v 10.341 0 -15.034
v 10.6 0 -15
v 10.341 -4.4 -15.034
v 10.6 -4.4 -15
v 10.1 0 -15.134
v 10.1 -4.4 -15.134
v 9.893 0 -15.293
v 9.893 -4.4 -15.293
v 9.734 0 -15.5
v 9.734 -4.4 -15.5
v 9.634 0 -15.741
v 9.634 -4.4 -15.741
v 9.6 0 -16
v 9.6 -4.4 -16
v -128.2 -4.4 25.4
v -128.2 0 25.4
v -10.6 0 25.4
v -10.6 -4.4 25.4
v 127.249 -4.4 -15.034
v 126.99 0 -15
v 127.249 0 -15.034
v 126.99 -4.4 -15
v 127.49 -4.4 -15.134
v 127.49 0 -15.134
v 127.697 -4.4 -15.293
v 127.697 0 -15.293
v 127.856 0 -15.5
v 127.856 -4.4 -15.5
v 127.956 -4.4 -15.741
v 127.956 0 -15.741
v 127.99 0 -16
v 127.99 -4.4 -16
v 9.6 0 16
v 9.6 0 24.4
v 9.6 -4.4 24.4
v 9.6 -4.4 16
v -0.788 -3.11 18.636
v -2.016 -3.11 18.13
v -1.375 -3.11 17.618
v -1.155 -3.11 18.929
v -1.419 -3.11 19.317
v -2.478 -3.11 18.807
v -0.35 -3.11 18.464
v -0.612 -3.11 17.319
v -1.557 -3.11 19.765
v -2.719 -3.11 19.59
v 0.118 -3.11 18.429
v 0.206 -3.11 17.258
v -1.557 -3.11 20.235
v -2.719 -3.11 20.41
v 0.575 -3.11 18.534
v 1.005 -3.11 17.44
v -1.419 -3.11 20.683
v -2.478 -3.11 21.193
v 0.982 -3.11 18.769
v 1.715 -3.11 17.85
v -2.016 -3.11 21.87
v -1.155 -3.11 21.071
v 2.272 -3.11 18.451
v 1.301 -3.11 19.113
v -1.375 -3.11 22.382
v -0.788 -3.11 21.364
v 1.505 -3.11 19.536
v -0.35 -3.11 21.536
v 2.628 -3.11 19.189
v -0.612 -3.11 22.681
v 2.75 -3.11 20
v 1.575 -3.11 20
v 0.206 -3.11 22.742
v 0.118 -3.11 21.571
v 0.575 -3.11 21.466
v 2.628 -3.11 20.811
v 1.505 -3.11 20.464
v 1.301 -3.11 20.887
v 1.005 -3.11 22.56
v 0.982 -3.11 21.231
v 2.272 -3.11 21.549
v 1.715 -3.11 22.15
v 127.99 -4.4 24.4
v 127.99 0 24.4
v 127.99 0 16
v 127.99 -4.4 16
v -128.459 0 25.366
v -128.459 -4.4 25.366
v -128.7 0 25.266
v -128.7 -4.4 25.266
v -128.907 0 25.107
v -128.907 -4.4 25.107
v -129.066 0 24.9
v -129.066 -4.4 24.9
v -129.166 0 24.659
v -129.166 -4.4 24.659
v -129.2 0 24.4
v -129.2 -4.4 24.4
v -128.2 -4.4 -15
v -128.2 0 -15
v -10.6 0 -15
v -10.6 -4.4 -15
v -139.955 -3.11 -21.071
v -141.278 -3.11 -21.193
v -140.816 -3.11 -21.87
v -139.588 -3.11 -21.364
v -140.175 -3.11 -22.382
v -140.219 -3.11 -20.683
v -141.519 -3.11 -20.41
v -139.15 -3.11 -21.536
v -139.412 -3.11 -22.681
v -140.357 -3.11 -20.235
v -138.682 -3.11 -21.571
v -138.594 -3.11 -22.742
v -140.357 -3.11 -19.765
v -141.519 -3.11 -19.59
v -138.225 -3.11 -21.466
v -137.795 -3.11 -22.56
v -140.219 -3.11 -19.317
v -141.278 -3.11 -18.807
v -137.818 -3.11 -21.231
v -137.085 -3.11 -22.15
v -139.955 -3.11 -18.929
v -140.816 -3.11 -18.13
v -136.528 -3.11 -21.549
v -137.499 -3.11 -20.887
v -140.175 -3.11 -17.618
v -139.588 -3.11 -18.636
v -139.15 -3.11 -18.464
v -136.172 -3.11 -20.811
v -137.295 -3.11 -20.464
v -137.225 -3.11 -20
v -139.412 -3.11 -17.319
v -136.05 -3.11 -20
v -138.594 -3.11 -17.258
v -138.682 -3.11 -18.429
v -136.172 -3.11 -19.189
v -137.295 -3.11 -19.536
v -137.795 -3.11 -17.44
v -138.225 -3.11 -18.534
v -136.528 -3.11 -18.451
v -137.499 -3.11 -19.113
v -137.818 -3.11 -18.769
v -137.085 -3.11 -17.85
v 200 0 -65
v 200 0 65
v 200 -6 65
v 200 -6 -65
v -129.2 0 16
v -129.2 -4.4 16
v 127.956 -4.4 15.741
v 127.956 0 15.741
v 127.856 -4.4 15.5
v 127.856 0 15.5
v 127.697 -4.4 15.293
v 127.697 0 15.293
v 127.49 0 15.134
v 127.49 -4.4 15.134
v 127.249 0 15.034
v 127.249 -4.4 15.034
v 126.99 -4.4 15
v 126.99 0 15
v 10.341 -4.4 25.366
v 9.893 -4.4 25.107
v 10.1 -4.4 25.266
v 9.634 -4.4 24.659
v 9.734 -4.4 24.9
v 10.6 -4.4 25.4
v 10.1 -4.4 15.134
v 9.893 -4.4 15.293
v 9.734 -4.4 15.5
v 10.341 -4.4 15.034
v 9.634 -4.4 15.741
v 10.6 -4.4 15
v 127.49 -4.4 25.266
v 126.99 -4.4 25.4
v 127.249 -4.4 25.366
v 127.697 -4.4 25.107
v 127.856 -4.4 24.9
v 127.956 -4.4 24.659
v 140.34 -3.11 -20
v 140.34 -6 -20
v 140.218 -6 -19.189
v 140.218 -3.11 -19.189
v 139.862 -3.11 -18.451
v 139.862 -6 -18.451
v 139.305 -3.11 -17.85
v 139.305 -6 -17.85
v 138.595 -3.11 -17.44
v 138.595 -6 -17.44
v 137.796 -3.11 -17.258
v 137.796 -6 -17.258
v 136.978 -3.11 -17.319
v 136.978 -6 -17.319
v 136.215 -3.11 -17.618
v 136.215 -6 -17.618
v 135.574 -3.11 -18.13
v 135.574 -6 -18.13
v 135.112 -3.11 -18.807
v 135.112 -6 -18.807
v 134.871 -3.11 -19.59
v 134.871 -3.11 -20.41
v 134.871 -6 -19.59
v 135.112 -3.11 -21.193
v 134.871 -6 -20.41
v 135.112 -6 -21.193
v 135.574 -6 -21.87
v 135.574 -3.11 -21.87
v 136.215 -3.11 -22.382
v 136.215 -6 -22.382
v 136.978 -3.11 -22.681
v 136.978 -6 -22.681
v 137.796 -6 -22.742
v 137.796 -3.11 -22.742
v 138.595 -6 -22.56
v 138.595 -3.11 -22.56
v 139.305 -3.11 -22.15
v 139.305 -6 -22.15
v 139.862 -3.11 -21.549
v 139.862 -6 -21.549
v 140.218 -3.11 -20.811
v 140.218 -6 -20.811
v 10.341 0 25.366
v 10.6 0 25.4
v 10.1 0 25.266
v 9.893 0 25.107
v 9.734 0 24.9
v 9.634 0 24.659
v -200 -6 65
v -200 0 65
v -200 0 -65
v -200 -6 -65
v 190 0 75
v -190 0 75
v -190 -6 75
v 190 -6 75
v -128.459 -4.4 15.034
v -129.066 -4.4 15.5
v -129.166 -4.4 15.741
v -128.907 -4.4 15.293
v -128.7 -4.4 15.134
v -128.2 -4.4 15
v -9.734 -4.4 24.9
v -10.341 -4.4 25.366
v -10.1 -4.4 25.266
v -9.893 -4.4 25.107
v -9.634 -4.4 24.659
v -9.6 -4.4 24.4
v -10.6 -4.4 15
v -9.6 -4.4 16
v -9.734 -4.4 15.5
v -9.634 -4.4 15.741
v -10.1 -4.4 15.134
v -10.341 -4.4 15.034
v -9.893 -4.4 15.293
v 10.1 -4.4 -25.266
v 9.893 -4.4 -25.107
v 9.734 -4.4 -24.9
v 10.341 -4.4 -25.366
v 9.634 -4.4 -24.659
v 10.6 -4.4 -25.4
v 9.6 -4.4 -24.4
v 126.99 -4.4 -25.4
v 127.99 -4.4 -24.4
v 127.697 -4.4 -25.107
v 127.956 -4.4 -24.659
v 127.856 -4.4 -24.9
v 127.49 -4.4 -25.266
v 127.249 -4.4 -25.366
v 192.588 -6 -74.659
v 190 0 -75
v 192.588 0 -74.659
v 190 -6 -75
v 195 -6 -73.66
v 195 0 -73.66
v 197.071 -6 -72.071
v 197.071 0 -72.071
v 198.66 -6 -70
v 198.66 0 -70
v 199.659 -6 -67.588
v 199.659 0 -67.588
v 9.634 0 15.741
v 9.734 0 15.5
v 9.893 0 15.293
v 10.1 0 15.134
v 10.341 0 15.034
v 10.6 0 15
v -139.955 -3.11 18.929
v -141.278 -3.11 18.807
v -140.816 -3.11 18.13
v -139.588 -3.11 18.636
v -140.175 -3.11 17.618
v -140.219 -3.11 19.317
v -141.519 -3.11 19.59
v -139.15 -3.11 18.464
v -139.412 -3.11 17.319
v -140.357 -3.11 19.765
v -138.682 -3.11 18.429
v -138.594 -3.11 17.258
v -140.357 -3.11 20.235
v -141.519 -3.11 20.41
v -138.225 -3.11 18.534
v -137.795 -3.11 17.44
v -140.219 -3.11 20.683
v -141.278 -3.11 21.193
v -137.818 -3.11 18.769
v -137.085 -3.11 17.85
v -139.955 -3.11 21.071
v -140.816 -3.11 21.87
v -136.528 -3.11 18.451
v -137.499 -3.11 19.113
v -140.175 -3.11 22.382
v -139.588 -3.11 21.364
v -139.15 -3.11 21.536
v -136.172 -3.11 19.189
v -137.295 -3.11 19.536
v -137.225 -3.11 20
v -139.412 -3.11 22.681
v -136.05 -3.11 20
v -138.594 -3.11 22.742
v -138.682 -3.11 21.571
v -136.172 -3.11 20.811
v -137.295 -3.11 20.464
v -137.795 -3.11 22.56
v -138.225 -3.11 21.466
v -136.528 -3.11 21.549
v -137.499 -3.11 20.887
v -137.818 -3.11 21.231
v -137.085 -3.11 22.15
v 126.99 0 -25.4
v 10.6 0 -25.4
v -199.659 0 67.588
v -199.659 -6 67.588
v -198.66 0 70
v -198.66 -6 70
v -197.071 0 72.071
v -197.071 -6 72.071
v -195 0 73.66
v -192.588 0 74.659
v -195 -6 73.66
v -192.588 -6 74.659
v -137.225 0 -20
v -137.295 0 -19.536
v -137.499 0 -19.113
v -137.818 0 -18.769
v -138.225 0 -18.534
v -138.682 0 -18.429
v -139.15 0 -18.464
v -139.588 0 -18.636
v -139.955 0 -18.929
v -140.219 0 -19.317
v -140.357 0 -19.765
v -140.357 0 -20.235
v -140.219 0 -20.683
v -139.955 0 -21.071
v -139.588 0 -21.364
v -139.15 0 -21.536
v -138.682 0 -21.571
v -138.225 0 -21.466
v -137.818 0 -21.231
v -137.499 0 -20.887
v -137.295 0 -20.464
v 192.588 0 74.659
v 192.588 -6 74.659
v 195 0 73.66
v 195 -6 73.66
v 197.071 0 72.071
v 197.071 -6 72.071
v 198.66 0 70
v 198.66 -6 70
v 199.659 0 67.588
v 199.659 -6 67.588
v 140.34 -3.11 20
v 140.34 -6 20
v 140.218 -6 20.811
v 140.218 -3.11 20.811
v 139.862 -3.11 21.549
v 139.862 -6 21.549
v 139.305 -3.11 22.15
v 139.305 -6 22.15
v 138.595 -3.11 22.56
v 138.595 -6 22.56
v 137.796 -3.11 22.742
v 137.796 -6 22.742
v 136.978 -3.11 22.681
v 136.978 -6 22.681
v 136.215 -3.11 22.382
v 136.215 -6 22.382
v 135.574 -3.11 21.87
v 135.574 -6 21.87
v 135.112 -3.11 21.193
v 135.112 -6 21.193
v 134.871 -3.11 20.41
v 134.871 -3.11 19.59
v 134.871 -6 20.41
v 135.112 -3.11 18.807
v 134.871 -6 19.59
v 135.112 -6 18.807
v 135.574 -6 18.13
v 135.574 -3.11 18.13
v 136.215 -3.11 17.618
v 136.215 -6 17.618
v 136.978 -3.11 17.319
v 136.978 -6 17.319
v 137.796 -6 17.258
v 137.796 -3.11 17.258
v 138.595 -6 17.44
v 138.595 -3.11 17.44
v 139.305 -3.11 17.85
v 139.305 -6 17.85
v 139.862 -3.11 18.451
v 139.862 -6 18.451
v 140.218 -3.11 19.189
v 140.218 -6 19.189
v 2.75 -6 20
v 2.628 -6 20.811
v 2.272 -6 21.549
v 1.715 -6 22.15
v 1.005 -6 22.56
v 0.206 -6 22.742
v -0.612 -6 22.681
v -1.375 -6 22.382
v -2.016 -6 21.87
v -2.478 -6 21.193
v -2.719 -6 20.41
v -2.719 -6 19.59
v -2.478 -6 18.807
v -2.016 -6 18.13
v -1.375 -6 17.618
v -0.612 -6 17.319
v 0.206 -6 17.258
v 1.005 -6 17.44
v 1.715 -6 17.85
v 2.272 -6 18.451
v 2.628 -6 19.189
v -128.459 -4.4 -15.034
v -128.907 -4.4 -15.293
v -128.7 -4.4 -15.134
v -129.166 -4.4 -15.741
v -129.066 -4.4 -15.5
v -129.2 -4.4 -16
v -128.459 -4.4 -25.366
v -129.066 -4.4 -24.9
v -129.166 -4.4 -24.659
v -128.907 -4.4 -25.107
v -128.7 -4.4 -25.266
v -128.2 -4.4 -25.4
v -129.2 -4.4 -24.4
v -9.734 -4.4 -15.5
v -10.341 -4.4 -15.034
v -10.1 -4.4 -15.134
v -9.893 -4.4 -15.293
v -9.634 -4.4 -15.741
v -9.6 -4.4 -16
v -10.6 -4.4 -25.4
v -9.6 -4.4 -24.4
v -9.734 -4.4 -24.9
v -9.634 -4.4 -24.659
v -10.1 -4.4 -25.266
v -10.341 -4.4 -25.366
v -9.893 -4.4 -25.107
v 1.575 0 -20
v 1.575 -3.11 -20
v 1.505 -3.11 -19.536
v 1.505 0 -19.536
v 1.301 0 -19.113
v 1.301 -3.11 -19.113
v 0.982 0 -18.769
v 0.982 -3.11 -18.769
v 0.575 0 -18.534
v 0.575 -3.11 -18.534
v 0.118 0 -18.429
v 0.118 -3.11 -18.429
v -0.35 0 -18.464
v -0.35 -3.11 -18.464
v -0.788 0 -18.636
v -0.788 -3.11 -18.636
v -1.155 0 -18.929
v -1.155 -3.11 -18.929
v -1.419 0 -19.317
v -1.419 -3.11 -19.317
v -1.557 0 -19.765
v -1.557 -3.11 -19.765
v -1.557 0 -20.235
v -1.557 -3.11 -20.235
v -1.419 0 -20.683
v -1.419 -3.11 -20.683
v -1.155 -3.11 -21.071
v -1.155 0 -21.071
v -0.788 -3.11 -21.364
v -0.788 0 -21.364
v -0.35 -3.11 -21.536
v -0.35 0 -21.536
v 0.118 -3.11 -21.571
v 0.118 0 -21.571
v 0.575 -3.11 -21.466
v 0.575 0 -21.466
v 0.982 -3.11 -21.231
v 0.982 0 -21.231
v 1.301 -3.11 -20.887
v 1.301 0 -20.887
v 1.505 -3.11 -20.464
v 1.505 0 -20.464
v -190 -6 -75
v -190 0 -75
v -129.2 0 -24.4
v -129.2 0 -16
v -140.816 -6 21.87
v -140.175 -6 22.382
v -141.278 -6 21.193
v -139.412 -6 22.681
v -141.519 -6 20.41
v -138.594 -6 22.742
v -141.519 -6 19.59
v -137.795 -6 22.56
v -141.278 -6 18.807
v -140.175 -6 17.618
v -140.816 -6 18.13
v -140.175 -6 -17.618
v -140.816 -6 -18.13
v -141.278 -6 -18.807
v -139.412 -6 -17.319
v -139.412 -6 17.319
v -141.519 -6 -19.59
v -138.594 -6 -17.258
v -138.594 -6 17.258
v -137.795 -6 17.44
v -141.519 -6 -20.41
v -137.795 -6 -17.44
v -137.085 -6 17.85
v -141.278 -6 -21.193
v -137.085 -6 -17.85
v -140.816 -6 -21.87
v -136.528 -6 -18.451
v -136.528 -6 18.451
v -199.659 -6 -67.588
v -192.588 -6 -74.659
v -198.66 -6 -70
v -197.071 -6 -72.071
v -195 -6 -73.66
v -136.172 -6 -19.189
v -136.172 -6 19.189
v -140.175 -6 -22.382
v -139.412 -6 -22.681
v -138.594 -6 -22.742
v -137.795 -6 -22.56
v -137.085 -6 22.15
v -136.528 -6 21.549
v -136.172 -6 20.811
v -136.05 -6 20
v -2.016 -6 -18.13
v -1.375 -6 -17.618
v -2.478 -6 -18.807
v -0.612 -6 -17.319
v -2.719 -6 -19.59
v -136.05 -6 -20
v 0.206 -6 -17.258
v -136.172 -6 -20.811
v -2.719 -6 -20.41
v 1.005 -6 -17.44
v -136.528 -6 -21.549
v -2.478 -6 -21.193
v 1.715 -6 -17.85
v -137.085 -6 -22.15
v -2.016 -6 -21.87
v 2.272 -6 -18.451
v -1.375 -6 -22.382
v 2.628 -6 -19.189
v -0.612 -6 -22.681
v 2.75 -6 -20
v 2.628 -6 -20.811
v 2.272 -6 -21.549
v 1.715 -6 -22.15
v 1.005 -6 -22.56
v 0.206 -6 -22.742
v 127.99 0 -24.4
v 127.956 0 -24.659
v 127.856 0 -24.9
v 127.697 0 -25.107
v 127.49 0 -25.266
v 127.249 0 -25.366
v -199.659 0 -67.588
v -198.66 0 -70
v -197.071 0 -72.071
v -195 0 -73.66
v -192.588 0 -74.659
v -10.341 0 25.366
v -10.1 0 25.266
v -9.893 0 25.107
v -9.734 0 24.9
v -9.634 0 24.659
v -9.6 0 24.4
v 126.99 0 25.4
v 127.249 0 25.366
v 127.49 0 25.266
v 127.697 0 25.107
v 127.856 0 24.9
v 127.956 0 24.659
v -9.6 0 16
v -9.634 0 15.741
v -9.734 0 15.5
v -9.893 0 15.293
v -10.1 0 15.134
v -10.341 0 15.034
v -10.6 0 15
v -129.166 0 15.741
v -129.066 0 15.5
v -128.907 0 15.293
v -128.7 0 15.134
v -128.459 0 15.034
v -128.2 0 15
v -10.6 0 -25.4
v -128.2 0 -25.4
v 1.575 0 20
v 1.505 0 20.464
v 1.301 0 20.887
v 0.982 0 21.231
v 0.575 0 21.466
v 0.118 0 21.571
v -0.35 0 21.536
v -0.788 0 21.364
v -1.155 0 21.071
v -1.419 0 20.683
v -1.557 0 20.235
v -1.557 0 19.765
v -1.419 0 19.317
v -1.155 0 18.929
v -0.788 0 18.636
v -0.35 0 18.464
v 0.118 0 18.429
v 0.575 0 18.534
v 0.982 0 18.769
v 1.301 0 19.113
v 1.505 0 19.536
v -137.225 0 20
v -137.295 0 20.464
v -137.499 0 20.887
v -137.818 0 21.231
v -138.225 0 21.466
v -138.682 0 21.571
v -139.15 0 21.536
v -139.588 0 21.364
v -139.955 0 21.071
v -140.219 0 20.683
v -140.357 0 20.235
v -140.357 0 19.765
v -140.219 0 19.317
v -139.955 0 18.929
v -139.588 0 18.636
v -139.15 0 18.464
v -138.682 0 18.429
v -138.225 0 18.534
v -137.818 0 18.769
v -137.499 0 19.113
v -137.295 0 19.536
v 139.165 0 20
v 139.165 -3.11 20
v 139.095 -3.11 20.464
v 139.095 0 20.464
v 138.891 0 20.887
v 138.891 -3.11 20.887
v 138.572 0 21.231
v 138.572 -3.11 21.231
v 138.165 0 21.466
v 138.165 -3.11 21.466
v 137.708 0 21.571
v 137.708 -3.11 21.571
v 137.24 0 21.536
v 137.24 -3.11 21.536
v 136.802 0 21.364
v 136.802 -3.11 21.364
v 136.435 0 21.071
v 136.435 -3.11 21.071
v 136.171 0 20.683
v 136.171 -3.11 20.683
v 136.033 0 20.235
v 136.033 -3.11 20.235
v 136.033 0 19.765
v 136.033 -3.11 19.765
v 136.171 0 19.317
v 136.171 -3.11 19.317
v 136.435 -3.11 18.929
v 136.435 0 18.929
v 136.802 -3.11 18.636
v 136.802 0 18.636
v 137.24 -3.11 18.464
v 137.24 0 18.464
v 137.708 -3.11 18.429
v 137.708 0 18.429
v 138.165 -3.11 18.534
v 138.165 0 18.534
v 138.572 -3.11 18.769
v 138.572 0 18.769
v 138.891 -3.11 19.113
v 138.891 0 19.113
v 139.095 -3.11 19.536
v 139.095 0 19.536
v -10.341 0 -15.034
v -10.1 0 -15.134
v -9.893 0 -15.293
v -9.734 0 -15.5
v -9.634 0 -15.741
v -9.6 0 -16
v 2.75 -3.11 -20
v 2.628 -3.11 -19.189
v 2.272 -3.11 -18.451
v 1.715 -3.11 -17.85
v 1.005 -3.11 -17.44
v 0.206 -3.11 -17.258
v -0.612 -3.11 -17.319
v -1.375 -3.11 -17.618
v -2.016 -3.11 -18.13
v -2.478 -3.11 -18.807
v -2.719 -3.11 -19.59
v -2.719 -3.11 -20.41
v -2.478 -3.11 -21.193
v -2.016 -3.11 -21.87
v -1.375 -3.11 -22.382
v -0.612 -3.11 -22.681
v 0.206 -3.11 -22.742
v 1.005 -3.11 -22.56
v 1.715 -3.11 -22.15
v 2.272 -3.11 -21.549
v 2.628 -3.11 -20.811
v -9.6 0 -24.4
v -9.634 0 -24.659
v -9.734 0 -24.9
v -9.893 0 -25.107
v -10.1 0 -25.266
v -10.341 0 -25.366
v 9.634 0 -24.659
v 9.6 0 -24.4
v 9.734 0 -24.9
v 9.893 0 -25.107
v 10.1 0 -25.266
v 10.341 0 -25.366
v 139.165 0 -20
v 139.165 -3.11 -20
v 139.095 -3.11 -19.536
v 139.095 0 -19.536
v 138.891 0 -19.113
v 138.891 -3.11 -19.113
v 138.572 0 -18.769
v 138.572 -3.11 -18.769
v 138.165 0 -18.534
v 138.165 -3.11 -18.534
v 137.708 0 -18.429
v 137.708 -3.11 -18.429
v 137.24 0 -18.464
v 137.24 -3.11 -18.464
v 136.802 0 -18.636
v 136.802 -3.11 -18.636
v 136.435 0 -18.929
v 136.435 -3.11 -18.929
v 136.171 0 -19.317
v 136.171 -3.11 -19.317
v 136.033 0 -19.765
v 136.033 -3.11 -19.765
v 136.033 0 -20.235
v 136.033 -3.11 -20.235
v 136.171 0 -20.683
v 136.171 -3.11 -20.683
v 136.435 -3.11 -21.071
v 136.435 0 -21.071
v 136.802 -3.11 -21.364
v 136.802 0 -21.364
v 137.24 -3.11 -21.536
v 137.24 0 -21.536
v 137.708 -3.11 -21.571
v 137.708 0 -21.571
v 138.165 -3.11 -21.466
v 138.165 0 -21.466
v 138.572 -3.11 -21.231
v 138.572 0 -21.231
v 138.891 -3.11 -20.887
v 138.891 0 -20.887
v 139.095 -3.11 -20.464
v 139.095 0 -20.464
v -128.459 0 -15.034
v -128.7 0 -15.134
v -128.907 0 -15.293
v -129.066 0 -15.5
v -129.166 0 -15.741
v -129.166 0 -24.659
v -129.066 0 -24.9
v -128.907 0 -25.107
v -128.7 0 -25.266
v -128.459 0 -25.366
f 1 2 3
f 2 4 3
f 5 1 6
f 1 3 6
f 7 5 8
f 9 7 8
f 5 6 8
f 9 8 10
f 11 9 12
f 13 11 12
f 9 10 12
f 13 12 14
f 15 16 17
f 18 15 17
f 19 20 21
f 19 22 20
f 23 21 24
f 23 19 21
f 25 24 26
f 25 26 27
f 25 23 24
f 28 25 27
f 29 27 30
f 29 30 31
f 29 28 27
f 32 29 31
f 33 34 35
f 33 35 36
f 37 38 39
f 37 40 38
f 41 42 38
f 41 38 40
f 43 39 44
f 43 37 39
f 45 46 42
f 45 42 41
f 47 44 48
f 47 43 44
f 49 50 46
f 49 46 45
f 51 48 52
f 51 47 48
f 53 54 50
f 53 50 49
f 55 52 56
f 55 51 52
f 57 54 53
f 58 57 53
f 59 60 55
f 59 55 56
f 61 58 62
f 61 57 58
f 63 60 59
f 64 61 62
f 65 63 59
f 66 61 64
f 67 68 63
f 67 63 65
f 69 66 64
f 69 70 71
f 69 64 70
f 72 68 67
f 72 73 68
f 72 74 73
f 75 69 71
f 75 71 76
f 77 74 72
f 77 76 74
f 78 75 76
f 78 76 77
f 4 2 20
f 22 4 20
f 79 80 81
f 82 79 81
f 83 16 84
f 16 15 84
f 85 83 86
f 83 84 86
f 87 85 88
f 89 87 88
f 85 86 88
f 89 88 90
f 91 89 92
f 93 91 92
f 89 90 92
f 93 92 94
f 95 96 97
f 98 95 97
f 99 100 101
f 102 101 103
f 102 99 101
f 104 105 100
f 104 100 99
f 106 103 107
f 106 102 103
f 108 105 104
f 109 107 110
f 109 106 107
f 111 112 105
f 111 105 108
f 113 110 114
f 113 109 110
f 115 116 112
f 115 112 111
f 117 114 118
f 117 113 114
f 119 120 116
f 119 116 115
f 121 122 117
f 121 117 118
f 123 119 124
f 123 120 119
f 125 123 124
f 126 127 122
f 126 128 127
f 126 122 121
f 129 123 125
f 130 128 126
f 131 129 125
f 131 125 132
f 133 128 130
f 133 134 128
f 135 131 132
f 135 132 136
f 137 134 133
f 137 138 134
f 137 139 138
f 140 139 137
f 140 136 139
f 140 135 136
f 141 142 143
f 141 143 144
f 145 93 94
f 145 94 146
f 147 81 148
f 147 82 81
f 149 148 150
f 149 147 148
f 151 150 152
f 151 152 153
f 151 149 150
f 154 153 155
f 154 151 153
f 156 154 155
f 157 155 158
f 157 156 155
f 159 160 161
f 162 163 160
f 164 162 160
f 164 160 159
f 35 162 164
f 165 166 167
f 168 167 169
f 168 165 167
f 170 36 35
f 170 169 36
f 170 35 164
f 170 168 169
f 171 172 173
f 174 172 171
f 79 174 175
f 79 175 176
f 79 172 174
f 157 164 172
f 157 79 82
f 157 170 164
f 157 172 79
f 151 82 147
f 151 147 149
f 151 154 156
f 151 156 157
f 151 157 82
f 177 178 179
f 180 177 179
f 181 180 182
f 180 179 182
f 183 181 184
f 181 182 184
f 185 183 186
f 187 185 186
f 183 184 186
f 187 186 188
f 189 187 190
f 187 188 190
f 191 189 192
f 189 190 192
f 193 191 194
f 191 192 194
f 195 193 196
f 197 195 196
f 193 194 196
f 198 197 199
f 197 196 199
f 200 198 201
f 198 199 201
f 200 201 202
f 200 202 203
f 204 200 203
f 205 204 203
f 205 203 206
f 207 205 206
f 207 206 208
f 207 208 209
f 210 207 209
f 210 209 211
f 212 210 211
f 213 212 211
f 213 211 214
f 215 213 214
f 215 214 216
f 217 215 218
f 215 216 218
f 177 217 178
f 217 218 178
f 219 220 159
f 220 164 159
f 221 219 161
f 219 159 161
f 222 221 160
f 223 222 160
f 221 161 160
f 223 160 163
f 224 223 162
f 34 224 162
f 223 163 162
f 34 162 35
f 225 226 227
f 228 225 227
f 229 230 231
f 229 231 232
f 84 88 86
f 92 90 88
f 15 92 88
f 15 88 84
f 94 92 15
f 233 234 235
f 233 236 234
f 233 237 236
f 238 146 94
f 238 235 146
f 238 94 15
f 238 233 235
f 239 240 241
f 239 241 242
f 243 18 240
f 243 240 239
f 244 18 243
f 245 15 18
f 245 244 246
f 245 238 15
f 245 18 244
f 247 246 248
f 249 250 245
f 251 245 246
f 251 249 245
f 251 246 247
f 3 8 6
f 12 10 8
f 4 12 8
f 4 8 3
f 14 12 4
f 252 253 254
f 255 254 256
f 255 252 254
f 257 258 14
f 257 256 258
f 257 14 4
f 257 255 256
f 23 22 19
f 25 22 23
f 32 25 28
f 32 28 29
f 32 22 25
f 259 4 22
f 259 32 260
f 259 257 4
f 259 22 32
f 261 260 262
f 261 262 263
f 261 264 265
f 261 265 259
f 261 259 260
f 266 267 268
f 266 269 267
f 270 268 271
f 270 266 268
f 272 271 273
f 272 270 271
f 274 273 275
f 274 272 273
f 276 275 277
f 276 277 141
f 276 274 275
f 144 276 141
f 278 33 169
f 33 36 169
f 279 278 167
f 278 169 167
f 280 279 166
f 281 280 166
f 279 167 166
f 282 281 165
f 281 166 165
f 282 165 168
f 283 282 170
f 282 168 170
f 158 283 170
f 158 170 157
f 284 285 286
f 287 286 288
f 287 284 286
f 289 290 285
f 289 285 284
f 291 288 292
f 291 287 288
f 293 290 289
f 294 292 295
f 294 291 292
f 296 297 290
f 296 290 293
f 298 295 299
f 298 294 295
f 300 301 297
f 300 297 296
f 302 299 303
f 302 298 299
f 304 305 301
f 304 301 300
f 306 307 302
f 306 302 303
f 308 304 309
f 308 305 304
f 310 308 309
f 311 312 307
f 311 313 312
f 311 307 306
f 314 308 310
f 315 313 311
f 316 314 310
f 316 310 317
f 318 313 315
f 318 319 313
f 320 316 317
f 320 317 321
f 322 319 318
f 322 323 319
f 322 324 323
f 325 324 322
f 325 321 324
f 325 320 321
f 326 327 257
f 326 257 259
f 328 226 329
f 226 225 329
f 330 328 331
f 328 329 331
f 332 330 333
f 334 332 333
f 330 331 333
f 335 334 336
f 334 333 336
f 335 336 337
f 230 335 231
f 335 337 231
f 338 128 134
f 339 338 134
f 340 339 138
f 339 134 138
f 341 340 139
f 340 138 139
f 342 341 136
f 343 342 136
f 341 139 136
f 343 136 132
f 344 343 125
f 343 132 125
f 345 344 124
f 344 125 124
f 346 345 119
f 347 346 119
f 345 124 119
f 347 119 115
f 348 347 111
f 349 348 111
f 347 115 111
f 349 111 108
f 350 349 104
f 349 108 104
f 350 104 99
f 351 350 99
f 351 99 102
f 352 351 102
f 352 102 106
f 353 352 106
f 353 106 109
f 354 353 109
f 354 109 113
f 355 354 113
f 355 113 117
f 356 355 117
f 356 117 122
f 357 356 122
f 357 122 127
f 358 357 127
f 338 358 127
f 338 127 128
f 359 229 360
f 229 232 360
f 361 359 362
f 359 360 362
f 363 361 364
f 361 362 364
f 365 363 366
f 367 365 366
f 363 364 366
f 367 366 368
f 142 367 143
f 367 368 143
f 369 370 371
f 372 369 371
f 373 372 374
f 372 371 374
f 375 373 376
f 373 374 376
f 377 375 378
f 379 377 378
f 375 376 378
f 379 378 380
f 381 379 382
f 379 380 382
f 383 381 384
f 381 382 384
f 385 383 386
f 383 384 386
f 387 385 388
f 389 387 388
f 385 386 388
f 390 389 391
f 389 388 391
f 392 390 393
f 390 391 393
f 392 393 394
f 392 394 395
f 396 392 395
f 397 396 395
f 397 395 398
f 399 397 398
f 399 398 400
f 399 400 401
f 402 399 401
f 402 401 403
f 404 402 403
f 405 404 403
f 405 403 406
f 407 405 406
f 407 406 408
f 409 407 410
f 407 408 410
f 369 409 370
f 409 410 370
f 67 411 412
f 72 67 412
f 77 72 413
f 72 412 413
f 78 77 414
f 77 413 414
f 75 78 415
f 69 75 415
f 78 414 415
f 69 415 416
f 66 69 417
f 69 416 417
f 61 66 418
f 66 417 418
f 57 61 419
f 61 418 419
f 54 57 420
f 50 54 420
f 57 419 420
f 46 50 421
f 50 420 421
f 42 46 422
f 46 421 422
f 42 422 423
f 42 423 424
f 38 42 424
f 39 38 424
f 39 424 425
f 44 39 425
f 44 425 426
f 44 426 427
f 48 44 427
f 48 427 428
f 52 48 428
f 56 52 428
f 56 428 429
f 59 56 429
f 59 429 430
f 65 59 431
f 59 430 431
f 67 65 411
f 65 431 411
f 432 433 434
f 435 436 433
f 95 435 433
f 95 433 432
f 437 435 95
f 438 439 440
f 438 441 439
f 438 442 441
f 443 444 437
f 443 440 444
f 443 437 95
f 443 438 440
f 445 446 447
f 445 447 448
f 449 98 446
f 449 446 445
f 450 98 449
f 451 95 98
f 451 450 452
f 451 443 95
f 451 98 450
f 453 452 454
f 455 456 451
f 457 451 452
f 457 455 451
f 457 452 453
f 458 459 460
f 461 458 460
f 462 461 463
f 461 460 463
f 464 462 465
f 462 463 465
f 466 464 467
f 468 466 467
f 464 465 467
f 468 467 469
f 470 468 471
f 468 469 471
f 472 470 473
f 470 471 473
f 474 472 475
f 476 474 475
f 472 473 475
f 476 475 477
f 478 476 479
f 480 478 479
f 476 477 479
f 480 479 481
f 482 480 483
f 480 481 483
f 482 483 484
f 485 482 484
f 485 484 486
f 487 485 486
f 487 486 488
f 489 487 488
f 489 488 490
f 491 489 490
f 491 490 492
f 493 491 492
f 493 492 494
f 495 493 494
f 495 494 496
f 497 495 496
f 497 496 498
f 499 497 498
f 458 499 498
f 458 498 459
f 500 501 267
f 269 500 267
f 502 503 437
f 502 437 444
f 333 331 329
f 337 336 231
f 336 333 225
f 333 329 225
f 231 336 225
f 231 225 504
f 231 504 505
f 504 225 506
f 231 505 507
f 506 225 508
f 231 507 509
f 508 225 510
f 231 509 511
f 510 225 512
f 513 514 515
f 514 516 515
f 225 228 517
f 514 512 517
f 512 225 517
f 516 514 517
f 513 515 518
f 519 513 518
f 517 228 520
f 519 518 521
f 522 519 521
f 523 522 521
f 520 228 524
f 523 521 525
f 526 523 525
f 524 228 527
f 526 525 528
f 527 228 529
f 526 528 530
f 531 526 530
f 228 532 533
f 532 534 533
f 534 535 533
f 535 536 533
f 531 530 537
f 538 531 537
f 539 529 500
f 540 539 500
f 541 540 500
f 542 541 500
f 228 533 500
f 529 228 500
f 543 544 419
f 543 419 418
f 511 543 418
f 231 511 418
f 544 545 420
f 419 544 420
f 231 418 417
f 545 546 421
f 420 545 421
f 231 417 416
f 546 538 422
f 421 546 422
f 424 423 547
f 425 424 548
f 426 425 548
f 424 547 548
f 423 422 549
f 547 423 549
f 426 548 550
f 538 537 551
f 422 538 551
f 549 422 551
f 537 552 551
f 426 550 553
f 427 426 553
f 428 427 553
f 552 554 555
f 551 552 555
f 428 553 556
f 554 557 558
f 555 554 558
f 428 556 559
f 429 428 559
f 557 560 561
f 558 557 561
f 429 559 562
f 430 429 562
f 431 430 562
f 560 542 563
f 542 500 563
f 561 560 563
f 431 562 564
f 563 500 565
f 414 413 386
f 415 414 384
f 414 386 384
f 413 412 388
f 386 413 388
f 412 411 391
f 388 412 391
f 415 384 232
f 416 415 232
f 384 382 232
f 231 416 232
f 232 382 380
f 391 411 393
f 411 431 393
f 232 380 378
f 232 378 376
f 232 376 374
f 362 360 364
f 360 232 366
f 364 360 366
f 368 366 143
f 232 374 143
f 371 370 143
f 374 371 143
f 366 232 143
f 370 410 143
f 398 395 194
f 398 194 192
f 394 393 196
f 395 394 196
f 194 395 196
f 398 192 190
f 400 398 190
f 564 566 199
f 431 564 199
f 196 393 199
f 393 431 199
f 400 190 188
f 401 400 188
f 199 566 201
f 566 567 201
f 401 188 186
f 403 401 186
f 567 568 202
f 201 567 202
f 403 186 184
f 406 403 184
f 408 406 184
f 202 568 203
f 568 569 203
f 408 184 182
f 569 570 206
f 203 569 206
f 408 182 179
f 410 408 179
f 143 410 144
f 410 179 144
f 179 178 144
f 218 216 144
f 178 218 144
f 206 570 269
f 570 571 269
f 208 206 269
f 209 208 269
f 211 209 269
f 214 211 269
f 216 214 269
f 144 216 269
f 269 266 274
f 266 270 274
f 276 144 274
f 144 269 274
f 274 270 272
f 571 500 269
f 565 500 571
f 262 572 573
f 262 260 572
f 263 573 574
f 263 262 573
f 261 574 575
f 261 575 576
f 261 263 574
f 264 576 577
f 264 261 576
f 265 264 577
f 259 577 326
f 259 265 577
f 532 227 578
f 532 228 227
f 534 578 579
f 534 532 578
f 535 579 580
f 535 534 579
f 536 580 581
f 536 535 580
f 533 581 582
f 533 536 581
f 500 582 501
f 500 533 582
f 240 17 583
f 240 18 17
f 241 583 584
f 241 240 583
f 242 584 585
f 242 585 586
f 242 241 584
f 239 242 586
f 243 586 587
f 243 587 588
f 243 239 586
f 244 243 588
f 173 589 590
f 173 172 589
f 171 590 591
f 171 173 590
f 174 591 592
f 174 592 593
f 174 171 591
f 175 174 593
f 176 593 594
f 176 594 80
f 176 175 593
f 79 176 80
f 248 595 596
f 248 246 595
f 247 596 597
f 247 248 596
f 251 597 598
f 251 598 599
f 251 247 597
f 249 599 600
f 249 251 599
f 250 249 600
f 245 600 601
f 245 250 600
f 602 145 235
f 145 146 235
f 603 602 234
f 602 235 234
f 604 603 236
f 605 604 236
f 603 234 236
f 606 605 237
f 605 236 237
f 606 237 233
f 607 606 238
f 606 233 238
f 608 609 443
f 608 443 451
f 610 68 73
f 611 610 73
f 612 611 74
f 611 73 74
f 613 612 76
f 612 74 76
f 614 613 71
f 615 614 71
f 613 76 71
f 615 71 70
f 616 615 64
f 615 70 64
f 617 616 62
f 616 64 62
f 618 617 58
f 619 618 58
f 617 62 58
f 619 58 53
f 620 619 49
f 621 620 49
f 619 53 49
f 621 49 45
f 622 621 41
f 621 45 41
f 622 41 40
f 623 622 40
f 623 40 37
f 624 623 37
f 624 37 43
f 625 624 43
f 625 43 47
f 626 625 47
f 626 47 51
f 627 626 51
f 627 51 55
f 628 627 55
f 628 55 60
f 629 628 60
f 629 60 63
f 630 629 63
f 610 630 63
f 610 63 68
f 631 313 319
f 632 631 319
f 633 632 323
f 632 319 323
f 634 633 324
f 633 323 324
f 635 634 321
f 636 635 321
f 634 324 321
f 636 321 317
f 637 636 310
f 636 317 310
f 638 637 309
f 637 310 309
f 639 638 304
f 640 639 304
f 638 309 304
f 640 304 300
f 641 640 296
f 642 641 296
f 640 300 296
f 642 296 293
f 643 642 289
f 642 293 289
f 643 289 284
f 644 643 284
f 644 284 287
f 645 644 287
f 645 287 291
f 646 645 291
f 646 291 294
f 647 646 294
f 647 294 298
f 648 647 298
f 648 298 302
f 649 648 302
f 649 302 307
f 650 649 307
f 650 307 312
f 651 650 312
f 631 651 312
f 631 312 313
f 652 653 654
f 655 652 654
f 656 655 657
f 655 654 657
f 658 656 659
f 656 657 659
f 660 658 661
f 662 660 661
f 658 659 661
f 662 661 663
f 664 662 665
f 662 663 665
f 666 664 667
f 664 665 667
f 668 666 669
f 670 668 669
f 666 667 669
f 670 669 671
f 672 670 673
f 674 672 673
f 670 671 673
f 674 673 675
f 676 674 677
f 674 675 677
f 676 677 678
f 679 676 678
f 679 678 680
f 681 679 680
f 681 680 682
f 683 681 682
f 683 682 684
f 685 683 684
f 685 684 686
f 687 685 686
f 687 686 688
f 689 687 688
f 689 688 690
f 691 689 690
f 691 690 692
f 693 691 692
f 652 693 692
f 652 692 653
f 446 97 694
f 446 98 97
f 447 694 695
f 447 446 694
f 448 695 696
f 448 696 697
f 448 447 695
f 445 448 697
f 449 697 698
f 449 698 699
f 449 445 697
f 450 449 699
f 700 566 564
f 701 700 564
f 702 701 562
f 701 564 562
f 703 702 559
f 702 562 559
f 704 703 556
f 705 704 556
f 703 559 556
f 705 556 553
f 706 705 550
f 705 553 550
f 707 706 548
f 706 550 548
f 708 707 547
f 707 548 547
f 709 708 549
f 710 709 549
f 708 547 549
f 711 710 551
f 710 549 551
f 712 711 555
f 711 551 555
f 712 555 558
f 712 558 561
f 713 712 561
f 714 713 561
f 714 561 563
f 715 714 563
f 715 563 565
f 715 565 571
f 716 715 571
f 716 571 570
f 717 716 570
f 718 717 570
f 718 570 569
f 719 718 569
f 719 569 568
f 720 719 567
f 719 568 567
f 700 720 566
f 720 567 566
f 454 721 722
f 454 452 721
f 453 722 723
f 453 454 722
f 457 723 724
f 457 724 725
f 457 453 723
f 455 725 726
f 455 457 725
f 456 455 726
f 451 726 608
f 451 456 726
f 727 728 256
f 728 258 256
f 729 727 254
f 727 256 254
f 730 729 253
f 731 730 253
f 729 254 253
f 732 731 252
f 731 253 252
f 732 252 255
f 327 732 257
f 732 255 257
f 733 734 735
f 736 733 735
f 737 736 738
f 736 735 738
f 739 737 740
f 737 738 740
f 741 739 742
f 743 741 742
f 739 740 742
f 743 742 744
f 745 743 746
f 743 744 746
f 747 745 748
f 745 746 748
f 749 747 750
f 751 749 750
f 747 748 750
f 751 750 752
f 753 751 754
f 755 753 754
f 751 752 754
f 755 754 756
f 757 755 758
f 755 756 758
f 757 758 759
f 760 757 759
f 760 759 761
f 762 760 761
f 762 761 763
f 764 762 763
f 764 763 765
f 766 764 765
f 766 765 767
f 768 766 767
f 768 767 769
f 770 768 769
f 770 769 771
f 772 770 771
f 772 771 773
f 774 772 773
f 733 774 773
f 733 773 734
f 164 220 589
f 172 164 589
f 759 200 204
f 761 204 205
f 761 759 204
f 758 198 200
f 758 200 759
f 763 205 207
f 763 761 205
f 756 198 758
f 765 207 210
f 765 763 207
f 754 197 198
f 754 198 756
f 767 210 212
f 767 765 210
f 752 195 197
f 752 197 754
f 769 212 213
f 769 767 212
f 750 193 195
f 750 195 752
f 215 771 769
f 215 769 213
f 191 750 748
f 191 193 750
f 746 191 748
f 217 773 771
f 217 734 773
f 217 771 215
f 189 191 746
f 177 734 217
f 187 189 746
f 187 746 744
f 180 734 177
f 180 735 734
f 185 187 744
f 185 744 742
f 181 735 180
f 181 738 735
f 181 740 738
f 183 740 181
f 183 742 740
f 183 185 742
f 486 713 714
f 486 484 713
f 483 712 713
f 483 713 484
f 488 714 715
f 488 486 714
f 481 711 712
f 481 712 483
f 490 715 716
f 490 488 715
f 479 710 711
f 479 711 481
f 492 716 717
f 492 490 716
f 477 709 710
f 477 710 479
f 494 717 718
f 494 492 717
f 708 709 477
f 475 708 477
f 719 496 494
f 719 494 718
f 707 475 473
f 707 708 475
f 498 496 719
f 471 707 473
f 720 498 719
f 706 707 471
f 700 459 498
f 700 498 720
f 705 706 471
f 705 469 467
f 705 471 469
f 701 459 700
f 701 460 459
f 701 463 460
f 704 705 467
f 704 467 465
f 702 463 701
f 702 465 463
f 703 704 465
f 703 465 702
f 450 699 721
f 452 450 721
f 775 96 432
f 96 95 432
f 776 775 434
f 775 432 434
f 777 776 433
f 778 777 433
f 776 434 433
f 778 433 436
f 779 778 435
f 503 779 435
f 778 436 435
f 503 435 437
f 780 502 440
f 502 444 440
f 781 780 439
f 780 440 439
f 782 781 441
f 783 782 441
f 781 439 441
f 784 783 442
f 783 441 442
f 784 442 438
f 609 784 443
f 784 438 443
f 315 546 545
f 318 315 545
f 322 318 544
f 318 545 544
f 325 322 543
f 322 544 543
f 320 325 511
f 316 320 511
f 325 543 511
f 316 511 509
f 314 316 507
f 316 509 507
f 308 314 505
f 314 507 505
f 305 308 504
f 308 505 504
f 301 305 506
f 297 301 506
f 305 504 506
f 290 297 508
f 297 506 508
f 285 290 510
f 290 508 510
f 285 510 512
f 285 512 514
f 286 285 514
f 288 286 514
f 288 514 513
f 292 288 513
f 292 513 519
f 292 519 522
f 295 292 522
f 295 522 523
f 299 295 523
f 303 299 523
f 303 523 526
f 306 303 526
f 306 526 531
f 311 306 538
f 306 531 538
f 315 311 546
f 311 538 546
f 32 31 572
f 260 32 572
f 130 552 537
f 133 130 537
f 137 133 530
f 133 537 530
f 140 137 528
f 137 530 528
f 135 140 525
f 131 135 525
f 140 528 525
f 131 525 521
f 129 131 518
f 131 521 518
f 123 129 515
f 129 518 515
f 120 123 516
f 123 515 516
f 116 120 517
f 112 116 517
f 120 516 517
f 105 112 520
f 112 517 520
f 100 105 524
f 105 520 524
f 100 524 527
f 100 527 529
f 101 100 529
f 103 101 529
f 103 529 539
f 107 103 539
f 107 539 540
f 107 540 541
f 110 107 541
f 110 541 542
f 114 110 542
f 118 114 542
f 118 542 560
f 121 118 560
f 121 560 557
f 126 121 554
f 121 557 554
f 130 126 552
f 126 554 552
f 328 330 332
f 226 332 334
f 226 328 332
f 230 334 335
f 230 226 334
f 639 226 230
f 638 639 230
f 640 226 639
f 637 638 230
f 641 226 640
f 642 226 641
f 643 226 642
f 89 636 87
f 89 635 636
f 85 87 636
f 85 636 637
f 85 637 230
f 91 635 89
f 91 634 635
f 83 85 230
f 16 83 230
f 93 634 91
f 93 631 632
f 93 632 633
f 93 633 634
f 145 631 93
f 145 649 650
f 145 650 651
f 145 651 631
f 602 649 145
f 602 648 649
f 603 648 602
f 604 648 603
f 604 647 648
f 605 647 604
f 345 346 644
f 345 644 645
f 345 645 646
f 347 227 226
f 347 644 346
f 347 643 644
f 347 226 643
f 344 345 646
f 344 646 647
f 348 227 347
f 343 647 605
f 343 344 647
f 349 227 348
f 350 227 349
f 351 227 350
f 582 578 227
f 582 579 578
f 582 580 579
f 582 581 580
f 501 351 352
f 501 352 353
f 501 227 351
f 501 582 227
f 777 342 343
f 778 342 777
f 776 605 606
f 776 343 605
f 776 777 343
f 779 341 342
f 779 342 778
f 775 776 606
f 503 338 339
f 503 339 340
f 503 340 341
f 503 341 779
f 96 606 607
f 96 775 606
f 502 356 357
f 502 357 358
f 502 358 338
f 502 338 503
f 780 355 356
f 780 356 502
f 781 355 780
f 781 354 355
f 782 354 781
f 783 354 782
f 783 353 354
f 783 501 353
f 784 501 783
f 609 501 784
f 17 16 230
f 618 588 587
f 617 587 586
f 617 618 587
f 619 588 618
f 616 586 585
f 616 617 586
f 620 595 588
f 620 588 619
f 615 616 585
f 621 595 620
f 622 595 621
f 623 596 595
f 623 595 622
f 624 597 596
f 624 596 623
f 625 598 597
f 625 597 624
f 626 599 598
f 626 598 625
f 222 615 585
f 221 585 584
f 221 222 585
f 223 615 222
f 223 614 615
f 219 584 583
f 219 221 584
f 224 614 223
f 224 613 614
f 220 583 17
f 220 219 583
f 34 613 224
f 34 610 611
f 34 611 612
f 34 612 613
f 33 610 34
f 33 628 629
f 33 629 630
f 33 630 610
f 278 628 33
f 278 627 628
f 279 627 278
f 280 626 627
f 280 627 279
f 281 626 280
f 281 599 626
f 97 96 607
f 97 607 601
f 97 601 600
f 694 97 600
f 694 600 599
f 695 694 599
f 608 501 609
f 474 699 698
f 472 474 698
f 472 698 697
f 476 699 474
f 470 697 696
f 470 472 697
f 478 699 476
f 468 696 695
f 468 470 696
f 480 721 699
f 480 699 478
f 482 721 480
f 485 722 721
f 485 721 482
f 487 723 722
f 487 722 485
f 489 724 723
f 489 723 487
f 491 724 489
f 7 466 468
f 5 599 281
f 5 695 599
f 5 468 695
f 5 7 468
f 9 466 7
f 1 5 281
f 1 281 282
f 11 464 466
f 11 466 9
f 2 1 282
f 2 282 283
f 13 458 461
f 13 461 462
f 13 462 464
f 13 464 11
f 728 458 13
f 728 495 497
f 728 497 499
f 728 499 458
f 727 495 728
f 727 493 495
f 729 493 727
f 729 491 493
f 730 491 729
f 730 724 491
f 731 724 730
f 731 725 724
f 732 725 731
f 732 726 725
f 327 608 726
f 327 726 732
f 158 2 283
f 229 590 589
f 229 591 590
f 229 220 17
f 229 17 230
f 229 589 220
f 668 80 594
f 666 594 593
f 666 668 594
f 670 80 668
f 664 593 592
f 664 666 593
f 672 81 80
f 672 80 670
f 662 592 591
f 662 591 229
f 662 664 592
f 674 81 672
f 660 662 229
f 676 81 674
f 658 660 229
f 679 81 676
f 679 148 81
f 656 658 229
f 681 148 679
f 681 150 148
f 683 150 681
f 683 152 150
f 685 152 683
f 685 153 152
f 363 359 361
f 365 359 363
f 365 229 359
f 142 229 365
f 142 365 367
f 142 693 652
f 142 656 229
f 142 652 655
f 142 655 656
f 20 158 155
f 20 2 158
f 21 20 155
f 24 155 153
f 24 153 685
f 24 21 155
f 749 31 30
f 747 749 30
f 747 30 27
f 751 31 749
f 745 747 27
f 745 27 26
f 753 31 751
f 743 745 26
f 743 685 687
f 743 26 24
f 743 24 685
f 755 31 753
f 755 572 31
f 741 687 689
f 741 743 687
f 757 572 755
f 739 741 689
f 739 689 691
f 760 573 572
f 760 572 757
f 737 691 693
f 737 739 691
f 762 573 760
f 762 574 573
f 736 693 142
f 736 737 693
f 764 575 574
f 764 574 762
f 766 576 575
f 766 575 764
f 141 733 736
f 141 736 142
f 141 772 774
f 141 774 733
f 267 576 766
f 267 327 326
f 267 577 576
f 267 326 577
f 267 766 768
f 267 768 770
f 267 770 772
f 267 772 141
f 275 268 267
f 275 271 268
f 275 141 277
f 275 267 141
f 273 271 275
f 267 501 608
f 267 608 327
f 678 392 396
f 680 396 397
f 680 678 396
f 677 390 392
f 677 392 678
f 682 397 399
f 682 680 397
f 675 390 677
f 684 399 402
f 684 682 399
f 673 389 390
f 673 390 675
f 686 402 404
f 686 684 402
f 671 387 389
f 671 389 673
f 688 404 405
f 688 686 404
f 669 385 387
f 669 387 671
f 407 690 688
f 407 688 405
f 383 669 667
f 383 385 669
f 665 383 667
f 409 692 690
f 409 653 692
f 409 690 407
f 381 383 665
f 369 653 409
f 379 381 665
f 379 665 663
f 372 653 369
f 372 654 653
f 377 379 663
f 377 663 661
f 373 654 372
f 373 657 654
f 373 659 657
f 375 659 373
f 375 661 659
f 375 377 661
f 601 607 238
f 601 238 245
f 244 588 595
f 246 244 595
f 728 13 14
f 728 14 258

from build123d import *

# Parameters (mm, degrees)
IZIM1_W                     = 400
IZIM1_H                     = 150
Y_KSEKLIK_EKSTR_ZYON1_DEPTH = 6
IZIM2_W                     = 119.6
IZIM2_H                     = 10.4
IZIM2_W_2                   = 118.39
KES_EKSTR_ZYON1_DEPTH       = 4.4
RADYUS1_R                   = 10
IZIM3_R                     = 1.575
KES_EKSTR_ZYON2_DEPTH       = 7
IZIM4_R                     = 2.75
KES_EKSTR_ZYON3_DEPTH       = 2.89
RADYUS2_R                   = 1


with BuildPart() as part:
    # Çizim1 → Yükseklik-Ekstrüzyon1 (new body)
    with BuildSketch(Plane(origin=(0, 0, 0), x_dir=(1, 0, 0), z_dir=(0, 1, 0))):
        Rectangle(IZIM1_W, IZIM1_H)
    extrude(amount=-Y_KSEKLIK_EKSTR_ZYON1_DEPTH)

    # Çizim2 → Kes-Ekstrüzyon1 (cut)
    with BuildSketch(Plane(origin=(0, 0, 0), x_dir=(1, 0, 0), z_dir=(0, 1, 0))):
        with Locations((-69.4, 20.2)):
            Rectangle(IZIM2_W, IZIM2_H)
        with Locations((-69.4, -20.2)):
            Rectangle(IZIM2_W, IZIM2_H)
        with Locations((68.795, 20.2)):
            Rectangle(IZIM2_W_2, IZIM2_H)
        with Locations((68.795, -20.2)):
            Rectangle(IZIM2_W_2, IZIM2_H)
    extrude(amount=-KES_EKSTR_ZYON1_DEPTH, mode=Mode.SUBTRACT)

    # Radyus1
    radyus1_edges = [part.edges().sort_by_distance(p)[0] for p in [
        (200, -3, 75),
        (-200, -3, 75),
        (-200, -3, -75),
        (200, -3, -75),
    ]]
    fillet(radyus1_edges, radius=RADYUS1_R)

    # Çizim3 → Kes-Ekstrüzyon2 (cut, through all)
    with BuildSketch(Plane.XZ.offset(6)):
        with Locations((-138.8, 20)):
            Circle(IZIM3_R)
        with Locations((0, 20)):
            Circle(IZIM3_R)
        with Locations((137.59, 20)):
            Circle(IZIM3_R)
        with Locations((137.59, -20)):
            Circle(IZIM3_R)
        with Locations((0, -20)):
            Circle(IZIM3_R)
        with Locations((-138.8, -20)):
            Circle(IZIM3_R)
    extrude(amount=-KES_EKSTR_ZYON2_DEPTH, mode=Mode.SUBTRACT)

    # Çizim4 → Kes-Ekstrüzyon3 (cut)
    with BuildSketch(Plane.XZ.offset(6)):
        with Locations((-138.8, 20)):
            Circle(IZIM4_R)
        with Locations((0, 20)):
            Circle(IZIM4_R)
        with Locations((137.59, 20)):
            Circle(IZIM4_R)
        with Locations((137.59, -20)):
            Circle(IZIM4_R)
        with Locations((0, -20)):
            Circle(IZIM4_R)
        with Locations((-138.8, -20)):
            Circle(IZIM4_R)
    extrude(amount=-KES_EKSTR_ZYON3_DEPTH, mode=Mode.SUBTRACT)

    # Radyus2
    radyus2_edges = [part.edges().sort_by_distance(p)[0] for p in [
        (127.99, -2.2, -15),
        (9.6, -2.2, -15),
        (9.6, -2.2, -25.4),
        (127.99, -2.2, -25.4),
        (-9.6, -2.2, -25.4),
        (-9.6, -2.2, -15),
        (-129.2, -2.2, -15),
        (-129.2, -2.2, -25.4),
        (127.99, -2.2, 15),
        (127.99, -2.2, 25.4),
        (9.6, -2.2, 25.4),
        (9.6, -2.2, 15),
        (-9.6, -2.2, 15),
        (-9.6, -2.2, 25.4),
        (-129.2, -2.2, 25.4),
        (-129.2, -2.2, 15),
    ]]
    fillet(radyus2_edges, radius=RADYUS2_R)


solid = part.part
